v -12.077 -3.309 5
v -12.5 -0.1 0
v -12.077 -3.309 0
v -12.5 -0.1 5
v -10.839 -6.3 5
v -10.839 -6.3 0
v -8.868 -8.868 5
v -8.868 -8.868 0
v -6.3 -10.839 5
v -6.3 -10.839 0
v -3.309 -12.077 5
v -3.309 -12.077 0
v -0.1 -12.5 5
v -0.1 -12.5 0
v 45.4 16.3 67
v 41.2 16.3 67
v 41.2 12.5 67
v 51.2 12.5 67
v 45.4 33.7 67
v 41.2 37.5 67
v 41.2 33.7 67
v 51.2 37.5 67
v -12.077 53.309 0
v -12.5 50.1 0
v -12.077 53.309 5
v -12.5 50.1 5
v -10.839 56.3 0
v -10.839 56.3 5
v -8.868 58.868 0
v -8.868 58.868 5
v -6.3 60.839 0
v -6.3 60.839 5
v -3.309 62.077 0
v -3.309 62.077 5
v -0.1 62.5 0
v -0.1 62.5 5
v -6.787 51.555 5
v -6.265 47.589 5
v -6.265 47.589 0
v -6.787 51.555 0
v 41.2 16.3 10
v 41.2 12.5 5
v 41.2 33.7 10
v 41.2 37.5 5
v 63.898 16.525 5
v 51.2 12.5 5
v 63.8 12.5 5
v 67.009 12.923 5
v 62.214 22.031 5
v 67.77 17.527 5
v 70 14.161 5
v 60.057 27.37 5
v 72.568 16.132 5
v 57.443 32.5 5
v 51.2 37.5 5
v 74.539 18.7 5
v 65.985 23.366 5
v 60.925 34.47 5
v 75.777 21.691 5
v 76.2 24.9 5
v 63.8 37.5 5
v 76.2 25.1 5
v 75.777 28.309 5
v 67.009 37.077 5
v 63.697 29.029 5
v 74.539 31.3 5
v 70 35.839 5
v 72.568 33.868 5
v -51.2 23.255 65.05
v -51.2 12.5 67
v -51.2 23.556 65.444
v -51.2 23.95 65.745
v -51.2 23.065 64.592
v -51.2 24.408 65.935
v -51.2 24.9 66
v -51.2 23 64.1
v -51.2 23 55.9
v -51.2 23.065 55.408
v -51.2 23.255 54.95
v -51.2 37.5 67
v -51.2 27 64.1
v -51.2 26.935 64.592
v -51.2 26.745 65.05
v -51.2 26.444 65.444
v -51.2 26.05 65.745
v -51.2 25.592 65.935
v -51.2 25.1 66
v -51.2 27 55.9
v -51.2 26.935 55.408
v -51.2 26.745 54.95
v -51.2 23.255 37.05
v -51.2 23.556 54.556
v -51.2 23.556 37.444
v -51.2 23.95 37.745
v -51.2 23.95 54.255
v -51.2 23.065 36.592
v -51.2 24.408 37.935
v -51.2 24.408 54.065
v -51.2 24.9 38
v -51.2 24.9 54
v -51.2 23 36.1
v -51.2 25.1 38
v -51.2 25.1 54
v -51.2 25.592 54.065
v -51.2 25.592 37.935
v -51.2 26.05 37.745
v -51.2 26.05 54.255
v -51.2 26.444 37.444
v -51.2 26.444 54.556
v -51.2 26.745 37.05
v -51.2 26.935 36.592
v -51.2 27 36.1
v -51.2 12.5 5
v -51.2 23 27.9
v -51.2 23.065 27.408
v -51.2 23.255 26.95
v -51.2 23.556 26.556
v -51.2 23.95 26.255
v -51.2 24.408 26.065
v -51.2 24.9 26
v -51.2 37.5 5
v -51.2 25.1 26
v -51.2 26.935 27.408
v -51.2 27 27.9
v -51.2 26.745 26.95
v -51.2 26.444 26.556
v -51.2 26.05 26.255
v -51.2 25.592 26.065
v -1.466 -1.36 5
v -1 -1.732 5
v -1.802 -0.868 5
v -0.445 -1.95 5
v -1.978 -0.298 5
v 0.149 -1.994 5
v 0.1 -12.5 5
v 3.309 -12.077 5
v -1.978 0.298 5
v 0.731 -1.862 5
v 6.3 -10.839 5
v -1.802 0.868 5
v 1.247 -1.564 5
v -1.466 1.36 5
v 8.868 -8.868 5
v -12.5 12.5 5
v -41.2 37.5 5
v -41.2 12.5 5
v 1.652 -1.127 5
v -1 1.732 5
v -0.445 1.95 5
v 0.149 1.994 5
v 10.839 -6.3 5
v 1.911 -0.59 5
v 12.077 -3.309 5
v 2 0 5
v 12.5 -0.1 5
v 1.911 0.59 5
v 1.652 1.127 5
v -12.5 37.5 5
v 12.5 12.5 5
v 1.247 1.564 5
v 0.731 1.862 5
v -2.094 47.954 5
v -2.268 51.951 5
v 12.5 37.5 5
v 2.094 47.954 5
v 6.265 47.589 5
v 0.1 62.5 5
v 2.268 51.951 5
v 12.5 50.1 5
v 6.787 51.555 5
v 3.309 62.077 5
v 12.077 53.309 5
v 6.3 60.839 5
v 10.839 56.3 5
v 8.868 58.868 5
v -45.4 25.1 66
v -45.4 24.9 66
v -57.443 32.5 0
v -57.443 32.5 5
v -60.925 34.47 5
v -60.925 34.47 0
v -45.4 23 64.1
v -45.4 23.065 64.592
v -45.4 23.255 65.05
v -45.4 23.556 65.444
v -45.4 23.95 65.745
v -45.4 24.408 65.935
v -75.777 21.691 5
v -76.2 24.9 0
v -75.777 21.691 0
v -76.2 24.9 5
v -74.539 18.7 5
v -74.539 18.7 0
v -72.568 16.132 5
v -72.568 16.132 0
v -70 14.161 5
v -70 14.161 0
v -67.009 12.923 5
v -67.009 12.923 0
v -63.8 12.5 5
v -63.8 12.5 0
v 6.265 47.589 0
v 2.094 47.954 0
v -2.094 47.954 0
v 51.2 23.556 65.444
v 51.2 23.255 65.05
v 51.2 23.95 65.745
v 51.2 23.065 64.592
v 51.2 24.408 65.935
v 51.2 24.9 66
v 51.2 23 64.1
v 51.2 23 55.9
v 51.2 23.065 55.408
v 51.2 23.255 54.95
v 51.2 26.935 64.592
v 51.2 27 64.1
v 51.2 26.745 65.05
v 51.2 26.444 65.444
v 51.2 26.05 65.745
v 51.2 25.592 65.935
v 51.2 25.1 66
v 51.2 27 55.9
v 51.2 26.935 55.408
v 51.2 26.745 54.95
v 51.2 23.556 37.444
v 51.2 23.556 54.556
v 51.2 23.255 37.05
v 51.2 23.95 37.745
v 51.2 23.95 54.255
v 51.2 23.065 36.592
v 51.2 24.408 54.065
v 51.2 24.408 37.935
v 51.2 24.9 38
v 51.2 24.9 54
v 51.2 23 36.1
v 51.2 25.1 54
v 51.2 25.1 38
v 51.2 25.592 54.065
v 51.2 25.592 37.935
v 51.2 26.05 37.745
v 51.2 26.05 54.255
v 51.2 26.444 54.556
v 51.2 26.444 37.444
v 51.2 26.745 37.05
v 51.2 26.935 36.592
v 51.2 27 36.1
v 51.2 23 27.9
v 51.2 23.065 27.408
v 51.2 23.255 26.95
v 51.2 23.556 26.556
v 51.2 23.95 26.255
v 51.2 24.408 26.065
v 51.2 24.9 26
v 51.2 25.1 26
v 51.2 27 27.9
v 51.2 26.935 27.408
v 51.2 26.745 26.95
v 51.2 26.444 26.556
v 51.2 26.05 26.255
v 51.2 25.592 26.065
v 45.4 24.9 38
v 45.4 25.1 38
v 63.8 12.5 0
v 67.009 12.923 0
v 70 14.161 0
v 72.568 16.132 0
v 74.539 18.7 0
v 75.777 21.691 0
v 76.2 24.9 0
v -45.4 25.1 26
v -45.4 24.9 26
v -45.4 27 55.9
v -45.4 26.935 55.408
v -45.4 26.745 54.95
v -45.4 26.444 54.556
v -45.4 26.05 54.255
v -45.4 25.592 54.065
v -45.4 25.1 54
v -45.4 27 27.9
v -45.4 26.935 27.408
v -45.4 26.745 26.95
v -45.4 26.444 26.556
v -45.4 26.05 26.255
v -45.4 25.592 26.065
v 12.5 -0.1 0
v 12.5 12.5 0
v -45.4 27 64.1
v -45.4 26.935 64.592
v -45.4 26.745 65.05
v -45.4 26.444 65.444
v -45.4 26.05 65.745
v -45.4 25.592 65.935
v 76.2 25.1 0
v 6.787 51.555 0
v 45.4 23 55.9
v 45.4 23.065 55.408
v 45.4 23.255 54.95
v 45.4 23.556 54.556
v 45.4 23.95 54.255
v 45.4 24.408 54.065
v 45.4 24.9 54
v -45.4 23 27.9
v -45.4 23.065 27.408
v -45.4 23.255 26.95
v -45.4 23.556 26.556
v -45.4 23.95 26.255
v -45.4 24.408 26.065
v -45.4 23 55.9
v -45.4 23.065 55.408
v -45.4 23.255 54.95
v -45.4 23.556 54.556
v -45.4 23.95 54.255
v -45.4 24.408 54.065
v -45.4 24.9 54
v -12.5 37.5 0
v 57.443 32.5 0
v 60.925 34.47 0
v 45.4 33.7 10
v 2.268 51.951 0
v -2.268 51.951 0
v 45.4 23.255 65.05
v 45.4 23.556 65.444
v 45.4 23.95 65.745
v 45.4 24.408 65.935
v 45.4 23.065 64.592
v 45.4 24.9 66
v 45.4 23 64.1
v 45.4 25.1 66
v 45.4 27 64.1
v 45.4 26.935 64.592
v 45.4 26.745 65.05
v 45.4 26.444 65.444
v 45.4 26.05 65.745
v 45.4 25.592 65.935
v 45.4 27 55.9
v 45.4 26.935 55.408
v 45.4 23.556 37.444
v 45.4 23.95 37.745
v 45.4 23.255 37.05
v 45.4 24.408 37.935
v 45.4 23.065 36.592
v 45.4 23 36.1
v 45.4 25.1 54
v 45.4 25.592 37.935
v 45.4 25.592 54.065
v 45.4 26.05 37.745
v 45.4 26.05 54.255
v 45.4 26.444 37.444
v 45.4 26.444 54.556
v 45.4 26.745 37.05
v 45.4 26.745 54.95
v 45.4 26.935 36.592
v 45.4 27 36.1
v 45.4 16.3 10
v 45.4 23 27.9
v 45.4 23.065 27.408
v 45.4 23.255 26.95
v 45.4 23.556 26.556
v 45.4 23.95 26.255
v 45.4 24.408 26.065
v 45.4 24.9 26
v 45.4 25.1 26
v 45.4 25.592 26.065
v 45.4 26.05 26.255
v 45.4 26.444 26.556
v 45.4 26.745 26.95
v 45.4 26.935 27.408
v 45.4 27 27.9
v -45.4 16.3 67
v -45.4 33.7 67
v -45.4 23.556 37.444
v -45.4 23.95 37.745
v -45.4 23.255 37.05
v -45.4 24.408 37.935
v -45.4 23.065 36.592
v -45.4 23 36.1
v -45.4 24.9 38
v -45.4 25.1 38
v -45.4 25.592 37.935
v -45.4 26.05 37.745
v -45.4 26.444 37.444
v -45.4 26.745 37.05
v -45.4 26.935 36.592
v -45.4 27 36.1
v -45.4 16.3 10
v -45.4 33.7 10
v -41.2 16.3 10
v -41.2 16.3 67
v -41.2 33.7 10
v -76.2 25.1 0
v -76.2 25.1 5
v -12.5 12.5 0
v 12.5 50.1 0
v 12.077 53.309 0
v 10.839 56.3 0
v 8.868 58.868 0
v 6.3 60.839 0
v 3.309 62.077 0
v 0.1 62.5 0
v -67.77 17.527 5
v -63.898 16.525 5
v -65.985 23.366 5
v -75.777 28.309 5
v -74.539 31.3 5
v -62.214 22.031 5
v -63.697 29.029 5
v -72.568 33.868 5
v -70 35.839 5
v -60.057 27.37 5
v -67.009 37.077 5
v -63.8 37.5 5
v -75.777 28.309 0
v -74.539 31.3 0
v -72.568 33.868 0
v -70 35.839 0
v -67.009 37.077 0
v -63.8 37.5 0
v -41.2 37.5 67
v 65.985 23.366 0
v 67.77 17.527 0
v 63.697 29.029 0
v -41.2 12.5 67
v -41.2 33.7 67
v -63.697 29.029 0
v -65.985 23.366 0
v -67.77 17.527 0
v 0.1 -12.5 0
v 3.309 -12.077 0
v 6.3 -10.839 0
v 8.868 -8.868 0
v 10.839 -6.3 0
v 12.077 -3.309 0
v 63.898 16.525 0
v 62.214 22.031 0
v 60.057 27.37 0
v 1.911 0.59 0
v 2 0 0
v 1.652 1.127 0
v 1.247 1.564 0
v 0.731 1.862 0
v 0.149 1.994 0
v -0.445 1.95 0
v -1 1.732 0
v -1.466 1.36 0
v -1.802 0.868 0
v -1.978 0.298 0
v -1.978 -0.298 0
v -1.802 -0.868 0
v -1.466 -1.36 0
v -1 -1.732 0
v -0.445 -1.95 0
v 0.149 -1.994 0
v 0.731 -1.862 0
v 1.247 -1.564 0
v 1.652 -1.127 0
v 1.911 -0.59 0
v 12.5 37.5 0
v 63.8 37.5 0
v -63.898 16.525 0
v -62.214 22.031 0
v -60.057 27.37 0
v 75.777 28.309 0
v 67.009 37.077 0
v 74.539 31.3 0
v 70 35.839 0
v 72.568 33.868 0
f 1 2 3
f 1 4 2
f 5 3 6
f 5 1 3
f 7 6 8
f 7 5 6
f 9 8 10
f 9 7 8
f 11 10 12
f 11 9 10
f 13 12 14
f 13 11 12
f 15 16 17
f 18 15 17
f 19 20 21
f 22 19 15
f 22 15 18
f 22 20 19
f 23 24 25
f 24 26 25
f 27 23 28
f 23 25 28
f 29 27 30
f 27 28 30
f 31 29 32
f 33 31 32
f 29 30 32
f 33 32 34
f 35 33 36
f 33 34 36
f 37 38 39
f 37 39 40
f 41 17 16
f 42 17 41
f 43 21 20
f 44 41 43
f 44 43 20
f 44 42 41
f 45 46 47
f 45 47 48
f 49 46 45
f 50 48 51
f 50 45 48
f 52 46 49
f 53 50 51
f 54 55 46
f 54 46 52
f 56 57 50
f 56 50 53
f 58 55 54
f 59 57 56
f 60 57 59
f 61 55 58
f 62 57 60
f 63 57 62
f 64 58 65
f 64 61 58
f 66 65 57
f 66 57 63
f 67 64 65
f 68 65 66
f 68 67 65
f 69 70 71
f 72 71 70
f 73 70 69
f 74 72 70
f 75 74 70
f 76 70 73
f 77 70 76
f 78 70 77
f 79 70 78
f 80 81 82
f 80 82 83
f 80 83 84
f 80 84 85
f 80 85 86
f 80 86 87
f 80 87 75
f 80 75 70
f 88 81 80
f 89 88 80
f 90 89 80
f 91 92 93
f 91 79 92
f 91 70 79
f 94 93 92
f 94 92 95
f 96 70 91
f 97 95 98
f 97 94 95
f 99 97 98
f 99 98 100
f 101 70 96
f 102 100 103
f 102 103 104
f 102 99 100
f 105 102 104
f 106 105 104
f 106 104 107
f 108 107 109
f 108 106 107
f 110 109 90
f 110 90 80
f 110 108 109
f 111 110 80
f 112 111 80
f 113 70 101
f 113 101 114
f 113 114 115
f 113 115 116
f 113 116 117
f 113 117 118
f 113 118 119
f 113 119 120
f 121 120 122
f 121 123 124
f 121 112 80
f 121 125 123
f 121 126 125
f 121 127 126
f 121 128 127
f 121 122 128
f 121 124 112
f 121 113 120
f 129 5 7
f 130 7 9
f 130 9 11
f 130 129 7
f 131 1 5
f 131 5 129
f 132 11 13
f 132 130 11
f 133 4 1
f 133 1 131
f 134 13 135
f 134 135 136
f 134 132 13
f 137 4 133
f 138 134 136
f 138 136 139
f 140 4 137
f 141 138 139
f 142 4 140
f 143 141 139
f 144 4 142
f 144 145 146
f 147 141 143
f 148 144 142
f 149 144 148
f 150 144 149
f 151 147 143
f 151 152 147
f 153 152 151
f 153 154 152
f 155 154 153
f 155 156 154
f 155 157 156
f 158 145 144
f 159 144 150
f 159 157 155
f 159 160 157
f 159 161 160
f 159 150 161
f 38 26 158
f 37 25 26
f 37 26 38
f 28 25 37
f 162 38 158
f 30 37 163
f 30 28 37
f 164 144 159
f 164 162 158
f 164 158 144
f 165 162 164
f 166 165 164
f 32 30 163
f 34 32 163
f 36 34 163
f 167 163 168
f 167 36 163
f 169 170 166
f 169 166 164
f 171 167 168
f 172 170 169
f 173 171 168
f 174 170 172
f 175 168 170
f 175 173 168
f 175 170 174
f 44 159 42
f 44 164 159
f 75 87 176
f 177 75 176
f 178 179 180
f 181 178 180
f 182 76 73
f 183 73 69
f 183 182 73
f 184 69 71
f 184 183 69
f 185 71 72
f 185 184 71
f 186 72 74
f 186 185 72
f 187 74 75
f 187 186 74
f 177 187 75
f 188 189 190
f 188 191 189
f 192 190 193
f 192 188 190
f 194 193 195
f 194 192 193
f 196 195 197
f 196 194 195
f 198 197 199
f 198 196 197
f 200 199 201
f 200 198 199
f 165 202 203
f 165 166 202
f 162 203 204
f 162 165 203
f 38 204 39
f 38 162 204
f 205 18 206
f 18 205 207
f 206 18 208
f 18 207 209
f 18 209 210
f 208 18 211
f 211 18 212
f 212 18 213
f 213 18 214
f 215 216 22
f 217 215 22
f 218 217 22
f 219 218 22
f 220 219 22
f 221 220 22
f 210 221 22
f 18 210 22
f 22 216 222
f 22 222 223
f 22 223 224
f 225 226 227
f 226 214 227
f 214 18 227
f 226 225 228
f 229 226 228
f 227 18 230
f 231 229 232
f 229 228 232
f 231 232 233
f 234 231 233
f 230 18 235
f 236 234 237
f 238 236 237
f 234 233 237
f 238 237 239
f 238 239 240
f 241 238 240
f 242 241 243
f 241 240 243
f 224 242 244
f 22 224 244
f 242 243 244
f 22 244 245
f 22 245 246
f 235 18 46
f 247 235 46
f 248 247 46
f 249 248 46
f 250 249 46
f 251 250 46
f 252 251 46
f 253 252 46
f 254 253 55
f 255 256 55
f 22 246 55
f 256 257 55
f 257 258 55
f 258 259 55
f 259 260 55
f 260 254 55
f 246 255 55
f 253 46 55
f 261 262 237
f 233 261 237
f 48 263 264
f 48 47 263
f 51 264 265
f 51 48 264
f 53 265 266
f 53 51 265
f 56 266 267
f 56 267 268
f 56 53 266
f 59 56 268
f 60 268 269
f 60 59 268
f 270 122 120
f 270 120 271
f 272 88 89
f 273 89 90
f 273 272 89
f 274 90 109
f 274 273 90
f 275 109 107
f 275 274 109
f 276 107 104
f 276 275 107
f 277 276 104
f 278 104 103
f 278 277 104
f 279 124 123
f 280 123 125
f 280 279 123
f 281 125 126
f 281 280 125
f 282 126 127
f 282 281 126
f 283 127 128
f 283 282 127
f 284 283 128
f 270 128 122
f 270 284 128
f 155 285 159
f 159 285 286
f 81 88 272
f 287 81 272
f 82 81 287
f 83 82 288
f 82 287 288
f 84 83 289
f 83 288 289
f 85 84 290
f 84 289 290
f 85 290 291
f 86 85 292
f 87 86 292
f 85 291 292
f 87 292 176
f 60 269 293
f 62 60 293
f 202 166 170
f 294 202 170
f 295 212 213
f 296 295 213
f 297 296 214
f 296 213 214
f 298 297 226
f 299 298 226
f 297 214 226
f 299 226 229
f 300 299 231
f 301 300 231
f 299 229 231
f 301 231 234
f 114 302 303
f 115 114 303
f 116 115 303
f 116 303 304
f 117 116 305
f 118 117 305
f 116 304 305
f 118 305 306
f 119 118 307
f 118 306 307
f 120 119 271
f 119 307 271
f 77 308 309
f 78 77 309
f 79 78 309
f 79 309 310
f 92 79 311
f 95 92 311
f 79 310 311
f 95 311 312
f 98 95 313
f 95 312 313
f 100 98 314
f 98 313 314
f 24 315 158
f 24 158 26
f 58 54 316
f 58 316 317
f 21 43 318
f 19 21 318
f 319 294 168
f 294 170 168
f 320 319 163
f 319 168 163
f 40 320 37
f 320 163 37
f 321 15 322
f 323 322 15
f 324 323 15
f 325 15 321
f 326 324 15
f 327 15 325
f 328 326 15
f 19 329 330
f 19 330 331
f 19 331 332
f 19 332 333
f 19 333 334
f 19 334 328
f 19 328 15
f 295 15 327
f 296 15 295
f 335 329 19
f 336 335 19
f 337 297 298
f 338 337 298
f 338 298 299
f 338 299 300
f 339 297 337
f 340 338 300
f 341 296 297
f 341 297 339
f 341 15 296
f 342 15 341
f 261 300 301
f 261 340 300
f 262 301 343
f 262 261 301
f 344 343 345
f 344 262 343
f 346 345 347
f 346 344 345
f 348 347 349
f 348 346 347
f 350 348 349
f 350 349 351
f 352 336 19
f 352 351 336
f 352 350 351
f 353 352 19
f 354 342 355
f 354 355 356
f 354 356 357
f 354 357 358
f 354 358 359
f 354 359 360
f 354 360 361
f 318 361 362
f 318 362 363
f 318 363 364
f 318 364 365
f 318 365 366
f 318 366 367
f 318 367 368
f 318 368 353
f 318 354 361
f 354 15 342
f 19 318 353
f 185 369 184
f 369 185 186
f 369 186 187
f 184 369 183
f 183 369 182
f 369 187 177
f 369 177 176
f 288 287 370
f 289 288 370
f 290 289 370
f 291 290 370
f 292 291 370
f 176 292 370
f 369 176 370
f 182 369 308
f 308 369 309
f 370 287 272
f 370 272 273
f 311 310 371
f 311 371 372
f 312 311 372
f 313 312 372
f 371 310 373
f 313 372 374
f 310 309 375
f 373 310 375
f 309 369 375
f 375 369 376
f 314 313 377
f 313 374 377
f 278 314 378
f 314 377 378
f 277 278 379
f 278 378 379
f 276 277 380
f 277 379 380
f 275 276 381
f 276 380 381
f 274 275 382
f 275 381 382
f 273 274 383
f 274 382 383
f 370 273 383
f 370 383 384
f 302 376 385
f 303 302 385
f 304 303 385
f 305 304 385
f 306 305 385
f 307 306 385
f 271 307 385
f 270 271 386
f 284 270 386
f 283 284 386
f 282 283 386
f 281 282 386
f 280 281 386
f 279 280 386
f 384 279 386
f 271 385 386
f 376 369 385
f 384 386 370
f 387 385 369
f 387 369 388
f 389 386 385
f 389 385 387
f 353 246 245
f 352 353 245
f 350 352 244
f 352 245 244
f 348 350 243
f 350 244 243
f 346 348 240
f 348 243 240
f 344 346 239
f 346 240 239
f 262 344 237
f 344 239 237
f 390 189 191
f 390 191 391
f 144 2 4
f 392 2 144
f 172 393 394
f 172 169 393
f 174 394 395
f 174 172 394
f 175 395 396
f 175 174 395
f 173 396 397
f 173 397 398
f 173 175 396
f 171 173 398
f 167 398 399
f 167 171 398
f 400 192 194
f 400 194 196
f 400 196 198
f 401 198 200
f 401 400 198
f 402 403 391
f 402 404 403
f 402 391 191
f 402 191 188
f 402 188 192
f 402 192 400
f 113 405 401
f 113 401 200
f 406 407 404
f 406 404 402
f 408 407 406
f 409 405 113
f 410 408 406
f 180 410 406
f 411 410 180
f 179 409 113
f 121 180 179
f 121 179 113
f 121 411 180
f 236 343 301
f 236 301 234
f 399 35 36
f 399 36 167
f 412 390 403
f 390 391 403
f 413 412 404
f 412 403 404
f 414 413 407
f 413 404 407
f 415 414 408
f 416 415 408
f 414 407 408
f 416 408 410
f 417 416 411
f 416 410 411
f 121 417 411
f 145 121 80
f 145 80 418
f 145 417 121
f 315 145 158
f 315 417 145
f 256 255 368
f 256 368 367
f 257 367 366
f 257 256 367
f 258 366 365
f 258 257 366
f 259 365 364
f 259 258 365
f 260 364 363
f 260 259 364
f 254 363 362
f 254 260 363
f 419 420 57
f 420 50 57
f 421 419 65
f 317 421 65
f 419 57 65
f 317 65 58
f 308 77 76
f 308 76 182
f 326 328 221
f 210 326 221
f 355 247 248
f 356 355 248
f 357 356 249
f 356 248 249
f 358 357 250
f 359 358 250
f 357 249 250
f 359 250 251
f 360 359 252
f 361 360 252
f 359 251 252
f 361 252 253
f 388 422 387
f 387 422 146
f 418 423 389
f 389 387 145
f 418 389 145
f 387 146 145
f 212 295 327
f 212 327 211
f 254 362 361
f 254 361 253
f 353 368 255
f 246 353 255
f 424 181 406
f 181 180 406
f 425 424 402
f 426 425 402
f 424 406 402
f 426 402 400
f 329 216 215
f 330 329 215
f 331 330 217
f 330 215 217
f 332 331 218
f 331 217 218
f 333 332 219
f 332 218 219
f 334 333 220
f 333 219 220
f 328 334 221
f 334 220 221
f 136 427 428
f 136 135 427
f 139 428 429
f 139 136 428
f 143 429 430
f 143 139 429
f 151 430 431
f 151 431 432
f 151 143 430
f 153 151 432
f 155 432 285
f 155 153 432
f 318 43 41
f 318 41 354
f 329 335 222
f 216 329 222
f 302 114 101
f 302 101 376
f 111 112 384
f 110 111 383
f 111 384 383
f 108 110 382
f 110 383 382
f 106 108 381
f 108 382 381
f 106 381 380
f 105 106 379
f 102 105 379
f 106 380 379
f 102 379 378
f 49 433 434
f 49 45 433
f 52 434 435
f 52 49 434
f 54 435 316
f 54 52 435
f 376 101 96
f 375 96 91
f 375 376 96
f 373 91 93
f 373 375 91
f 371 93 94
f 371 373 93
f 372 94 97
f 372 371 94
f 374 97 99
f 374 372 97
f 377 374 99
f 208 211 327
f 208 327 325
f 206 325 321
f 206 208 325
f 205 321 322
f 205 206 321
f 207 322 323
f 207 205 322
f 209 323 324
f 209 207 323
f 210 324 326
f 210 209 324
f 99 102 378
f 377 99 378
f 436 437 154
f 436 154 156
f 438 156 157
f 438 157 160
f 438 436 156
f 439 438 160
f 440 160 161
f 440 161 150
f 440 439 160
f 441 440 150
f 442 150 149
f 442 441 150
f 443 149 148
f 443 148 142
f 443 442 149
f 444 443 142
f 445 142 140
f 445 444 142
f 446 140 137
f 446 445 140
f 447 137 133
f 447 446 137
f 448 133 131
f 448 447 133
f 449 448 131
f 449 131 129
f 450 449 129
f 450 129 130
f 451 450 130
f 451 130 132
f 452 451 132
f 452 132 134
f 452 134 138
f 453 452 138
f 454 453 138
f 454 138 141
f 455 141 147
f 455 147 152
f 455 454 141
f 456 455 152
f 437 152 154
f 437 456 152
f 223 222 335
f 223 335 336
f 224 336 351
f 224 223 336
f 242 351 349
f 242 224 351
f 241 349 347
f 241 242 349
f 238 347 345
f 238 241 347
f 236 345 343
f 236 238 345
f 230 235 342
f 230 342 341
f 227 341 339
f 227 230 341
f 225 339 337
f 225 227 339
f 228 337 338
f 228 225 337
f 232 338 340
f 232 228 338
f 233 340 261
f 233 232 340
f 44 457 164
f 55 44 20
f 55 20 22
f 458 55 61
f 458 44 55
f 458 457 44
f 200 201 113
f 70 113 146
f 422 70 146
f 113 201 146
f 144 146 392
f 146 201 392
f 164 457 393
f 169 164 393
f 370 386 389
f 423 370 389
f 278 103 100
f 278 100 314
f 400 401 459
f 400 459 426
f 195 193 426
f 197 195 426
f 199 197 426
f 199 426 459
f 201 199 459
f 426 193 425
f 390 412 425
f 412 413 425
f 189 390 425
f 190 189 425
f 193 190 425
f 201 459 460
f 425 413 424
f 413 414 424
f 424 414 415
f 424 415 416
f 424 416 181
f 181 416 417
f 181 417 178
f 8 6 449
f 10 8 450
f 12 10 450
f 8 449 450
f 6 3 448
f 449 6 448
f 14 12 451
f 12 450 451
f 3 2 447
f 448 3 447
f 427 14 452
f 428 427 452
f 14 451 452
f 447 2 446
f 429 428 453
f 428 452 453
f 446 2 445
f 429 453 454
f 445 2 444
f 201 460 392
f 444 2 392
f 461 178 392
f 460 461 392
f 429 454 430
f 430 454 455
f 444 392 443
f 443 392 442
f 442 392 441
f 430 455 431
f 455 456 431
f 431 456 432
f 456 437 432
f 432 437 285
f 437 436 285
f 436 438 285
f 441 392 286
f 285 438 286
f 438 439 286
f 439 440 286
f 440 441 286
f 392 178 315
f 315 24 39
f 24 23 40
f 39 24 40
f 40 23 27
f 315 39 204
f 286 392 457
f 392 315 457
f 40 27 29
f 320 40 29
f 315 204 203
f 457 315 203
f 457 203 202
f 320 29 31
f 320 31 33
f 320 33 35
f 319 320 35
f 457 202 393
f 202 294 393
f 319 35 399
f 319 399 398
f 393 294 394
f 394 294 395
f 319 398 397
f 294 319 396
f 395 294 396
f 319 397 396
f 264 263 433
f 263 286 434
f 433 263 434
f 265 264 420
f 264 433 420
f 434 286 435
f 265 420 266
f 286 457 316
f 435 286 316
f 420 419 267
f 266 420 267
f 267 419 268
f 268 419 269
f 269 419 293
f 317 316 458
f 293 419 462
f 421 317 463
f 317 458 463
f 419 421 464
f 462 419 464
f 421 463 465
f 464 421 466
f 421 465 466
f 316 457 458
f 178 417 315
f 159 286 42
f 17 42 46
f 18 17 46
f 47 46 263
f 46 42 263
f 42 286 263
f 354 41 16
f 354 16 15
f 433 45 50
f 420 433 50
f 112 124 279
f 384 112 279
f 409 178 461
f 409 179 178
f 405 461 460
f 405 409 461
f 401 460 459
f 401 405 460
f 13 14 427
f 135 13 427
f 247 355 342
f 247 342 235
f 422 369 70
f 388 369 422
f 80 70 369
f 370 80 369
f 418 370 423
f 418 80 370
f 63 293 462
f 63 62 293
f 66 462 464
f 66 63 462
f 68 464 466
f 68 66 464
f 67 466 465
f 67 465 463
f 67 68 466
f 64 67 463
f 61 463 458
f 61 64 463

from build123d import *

# Parameters (mm, degrees)
BOX011_W                    = 6
BOX011_H                    = 4
BOX011_DEPTH                = 12
FILLET009_R                 = 1.9
BOX013_W                    = 4.2
BOX013_H                    = 17.4
BOX013_DEPTH                = 67
BOX010_W                    = 6
BOX010_H                    = 4
BOX010_DEPTH                = 12
FILLET008_R                 = 1.9
BOX012_W                    = 10
BOX012_H                    = 25
BOX012_DEPTH                = 67
BOX007_W                    = 4.2
BOX007_H                    = 17.4
BOX007_DEPTH                = 67
BOX008_W                    = 6
BOX008_H                    = 4
BOX008_DEPTH                = 12
FILLET006_R                 = 1.9
BOX009_W                    = 6
BOX009_H                    = 4
BOX009_DEPTH                = 12
FILLET007_R                 = 1.9
BOX006_W                    = 10
BOX006_H                    = 25
BOX006_DEPTH                = 67
CYLINDER002_W               = 66
CYLINDER002_H               = 5
CYLINDER002_ANGLE           = 15
CYLINDER002_PLACEMENT_ANGLE = 14.5
CYLINDER001_W               = 70
CYLINDER001_H               = 5
CYLINDER001_ANGLE           = 15
CYLINDER001_PLACEMENT_ANGLE = 14.5
CYLINDER004_W               = 48
CYLINDER004_H               = 5
CYLINDER004_ANGLE           = 15
CYLINDER004_PLACEMENT_ANGLE = 82.5
CYLINDER003_W               = 52
CYLINDER003_H               = 5
CYLINDER003_ANGLE           = 15
CYLINDER003_PLACEMENT_ANGLE = 82.5
CYLINDER007_R               = 2
CYLINDER007_DEPTH           = 5
CYLINDER006_W               = 66
CYLINDER006_H               = 5
CYLINDER006_ANGLE           = 15
CYLINDER006_PLACEMENT_ANGLE = 150.5
CYLINDER005_W               = 70
CYLINDER005_H               = 5
CYLINDER005_ANGLE           = 15
CYLINDER005_PLACEMENT_ANGLE = 150.5
BOX015_W                    = 25
BOX015_H                    = 75
BOX015_DEPTH                = 5
FILLET011_R                 = 12.4
BOX014_W                    = 152.4
BOX014_H                    = 25
BOX014_DEPTH                = 5
FILLET010_R                 = 12.4


with BuildPart() as fillet009:
    # Box011 → Box011 (new body)
    with BuildSketch(Plane(origin=(-45, 23, 26), x_dir=(1, 0, 0), z_dir=(0, 0, 1))):
        with Locations((3, 2)):
            Rectangle(BOX011_W, BOX011_H)
    extrude(amount=BOX011_DEPTH)

    # Fillet009
    fillet009_edges = [fillet009.edges().sort_by_distance(p)[0] for p in [
        (-42, 23, 26),
        (-42, 23, 38),
        (-42, 27, 26),
        (-42, 27, 38),
    ]]
    fillet(fillet009_edges, radius=FILLET009_R)


with BuildPart() as w_rfel013:
    # Box013 → Box013 (new body)
    with BuildSketch(Plane(origin=(-39.2, 16.3, 10), x_dir=(1, 0, 0), z_dir=(0, 0, 1))):
        with Locations((2.1, 8.7)):
            Rectangle(BOX013_W, BOX013_H)
    extrude(amount=BOX013_DEPTH)


with BuildPart() as fusion003:
    # Box010 → Box010 (new body)
    with BuildSketch(Plane(origin=(-45, 23, 54), x_dir=(1, 0, 0), z_dir=(0, 0, 1))):
        with Locations((3, 2)):
            Rectangle(BOX010_W, BOX010_H)
    extrude(amount=BOX010_DEPTH)

    # Fillet008
    fillet008_edges = [fusion003.edges().sort_by_distance(p)[0] for p in [
        (-42, 23, 54),
        (-42, 23, 66),
        (-42, 27, 54),
        (-42, 27, 66),
    ]]
    fillet(fillet008_edges, radius=FILLET008_R)

    # Fusion003: union Fillet009, Würfel013
    add(fillet009.part)
    add(w_rfel013.part)


with BuildPart() as stuetze002:
    # Box012 → Box012 (new body)
    with BuildSketch(Plane(origin=(-45, 12.5, 0), x_dir=(1, 0, 0), z_dir=(0, 0, 1))):
        with Locations((5, 12.5)):
            Rectangle(BOX012_W, BOX012_H)
    extrude(amount=BOX012_DEPTH)

    # Cut006: cut Fusion003
    add(fusion003.part, mode=Mode.SUBTRACT)


with BuildPart() as stuetze002_1:
    # Cut006 placement: moved
    add(stuetze002.part.moved(Location((-6.2, 0, 0))))


with BuildPart() as w_rfel007:
    # Box007 → Box007 (new body)
    with BuildSketch(Plane(origin=(35, 16.3, 10), x_dir=(1, 0, 0), z_dir=(0, 0, 1))):
        with Locations((2.1, 8.7)):
            Rectangle(BOX007_W, BOX007_H)
    extrude(amount=BOX007_DEPTH)


with BuildPart() as fillet006:
    # Box008 → Box008 (new body)
    with BuildSketch(Plane(origin=(39, 23, 54), x_dir=(1, 0, 0), z_dir=(0, 0, 1))):
        with Locations((3, 2)):
            Rectangle(BOX008_W, BOX008_H)
    extrude(amount=BOX008_DEPTH)

    # Fillet006
    fillet006_edges = [fillet006.edges().sort_by_distance(p)[0] for p in [
        (42, 23, 54),
        (42, 23, 66),
        (42, 27, 54),
        (42, 27, 66),
    ]]
    fillet(fillet006_edges, radius=FILLET006_R)


with BuildPart() as fusion002:
    # Box009 → Box009 (new body)
    with BuildSketch(Plane(origin=(39, 23, 26), x_dir=(1, 0, 0), z_dir=(0, 0, 1))):
        with Locations((3, 2)):
            Rectangle(BOX009_W, BOX009_H)
    extrude(amount=BOX009_DEPTH)

    # Fillet007
    fillet007_edges = [fusion002.edges().sort_by_distance(p)[0] for p in [
        (42, 23, 26),
        (42, 23, 38),
        (42, 27, 26),
        (42, 27, 38),
    ]]
    fillet(fillet007_edges, radius=FILLET007_R)

    # Fusion002: union Würfel007, Fillet006
    add(w_rfel007.part)
    add(fillet006.part)


with BuildPart() as stuetze001:
    # Box006 → Box006 (new body)
    with BuildSketch(Plane(origin=(35, 12.5, 0), x_dir=(1, 0, 0), z_dir=(0, 0, 1))):
        with Locations((5, 12.5)):
            Rectangle(BOX006_W, BOX006_H)
    extrude(amount=BOX006_DEPTH)

    # Cut005: cut Fusion002
    add(fusion002.part, mode=Mode.SUBTRACT)


with BuildPart() as stuetze001_1:
    # Cut005 placement: moved
    add(stuetze001.part.moved(Location((6.2, 0, 0))))


with BuildPart() as zylinder002:
    # Cylinder002 → Cylinder002 (revolve)
    with BuildSketch(Plane.XZ):
        with Locations((33, 2.5)):
            Rectangle(CYLINDER002_W, CYLINDER002_H)
    revolve(axis=Axis((0, 0, 0), (0, 0, 1)), revolution_arc=CYLINDER002_ANGLE)


with BuildPart() as zylinder002_1:
    # Cylinder002 placement: moved
    add(zylinder002.part.rotate(Axis((0, 0, 0), (0, 0, 1)), CYLINDER002_PLACEMENT_ANGLE))


with BuildPart() as bohrschlitz001:
    # Cylinder001 → Cylinder001 (revolve)
    with BuildSketch(Plane.XZ):
        with Locations((35, 2.5)):
            Rectangle(CYLINDER001_W, CYLINDER001_H)
    revolve(axis=Axis((0, 0, 0), (0, 0, 1)), revolution_arc=CYLINDER001_ANGLE)


with BuildPart() as bohrschlitz001_1:
    # Cylinder001 placement: moved
    add(bohrschlitz001.part.rotate(Axis((0, 0, 0), (0, 0, 1)), CYLINDER001_PLACEMENT_ANGLE))

    # Cut: cut Zylinder002
    add(zylinder002_1.part, mode=Mode.SUBTRACT)


with BuildPart() as zylinder004:
    # Cylinder004 → Cylinder004 (revolve)
    with BuildSketch(Plane.XZ):
        with Locations((24, 2.5)):
            Rectangle(CYLINDER004_W, CYLINDER004_H)
    revolve(axis=Axis((0, 0, 0), (0, 0, 1)), revolution_arc=CYLINDER004_ANGLE)


with BuildPart() as zylinder004_1:
    # Cylinder004 placement: moved
    add(zylinder004.part.rotate(Axis((0, 0, 0), (0, 0, 1)), CYLINDER004_PLACEMENT_ANGLE))


with BuildPart() as bohrschlitz002:
    # Cylinder003 → Cylinder003 (revolve)
    with BuildSketch(Plane.XZ):
        with Locations((26, 2.5)):
            Rectangle(CYLINDER003_W, CYLINDER003_H)
    revolve(axis=Axis((0, 0, 0), (0, 0, 1)), revolution_arc=CYLINDER003_ANGLE)


with BuildPart() as bohrschlitz002_1:
    # Cylinder003 placement: moved
    add(bohrschlitz002.part.rotate(Axis((0, 0, 0), (0, 0, 1)), CYLINDER003_PLACEMENT_ANGLE))

    # Cut001: cut Zylinder004
    add(zylinder004_1.part, mode=Mode.SUBTRACT)


with BuildPart() as borhloch002:
    # Cylinder007 → Cylinder007 (new body)
    with BuildSketch(Plane.XY):
        Circle(CYLINDER007_R)
    extrude(amount=CYLINDER007_DEPTH)


with BuildPart() as zylinder006:
    # Cylinder006 → Cylinder006 (revolve)
    with BuildSketch(Plane.XZ):
        with Locations((33, 2.5)):
            Rectangle(CYLINDER006_W, CYLINDER006_H)
    revolve(axis=Axis((0, 0, 0), (0, 0, 1)), revolution_arc=CYLINDER006_ANGLE)


with BuildPart() as zylinder006_1:
    # Cylinder006 placement: moved
    add(zylinder006.part.rotate(Axis((0, 0, 0), (0, 0, 1)), CYLINDER006_PLACEMENT_ANGLE))


with BuildPart() as bohrschlitze_sockel:
    # Cylinder005 → Cylinder005 (revolve)
    with BuildSketch(Plane.XZ):
        with Locations((35, 2.5)):
            Rectangle(CYLINDER005_W, CYLINDER005_H)
    revolve(axis=Axis((0, 0, 0), (0, 0, 1)), revolution_arc=CYLINDER005_ANGLE)


with BuildPart() as bohrschlitze_sockel_1:
    # Cylinder005 placement: moved
    add(bohrschlitze_sockel.part.rotate(Axis((0, 0, 0), (0, 0, 1)), CYLINDER005_PLACEMENT_ANGLE))

    # Cut002: cut Zylinder006
    add(zylinder006_1.part, mode=Mode.SUBTRACT)

    # Fusion004: union Bohrschlitz001, Bohrschlitz002, Borhloch002
    add(bohrschlitz001_1.part)
    add(bohrschlitz002_1.part)
    add(borhloch002.part)


with BuildPart() as fillet002:
    # Box015 → Box015 (new body)
    with BuildSketch(Plane(origin=(-12.5, -12.5, 0), x_dir=(1, 0, 0), z_dir=(0, 0, 1))):
        with Locations((12.5, 37.5)):
            Rectangle(BOX015_W, BOX015_H)
    extrude(amount=BOX015_DEPTH)

    # Fillet011
    fillet011_edges = [fillet002.edges().sort_by_distance(p)[0] for p in [
        (-12.5, -12.5, 2.5),
        (-12.5, 62.5, 2.5),
        (12.5, -12.5, 2.5),
        (12.5, 62.5, 2.5),
    ]]
    fillet(fillet011_edges, radius=FILLET011_R)


with BuildPart() as fusion:
    # Box014 → Box014 (new body)
    with BuildSketch(Plane(origin=(-76.2, 12.5, 0), x_dir=(1, 0, 0), z_dir=(0, 0, 1))):
        with Locations((76.2, 12.5)):
            Rectangle(BOX014_W, BOX014_H)
    extrude(amount=BOX014_DEPTH)

    # Fillet010
    fillet010_edges = [fusion.edges().sort_by_distance(p)[0] for p in [
        (-76.2, 12.5, 2.5),
        (-76.2, 37.5, 2.5),
        (76.2, 12.5, 2.5),
        (76.2, 37.5, 2.5),
    ]]
    fillet(fillet010_edges, radius=FILLET010_R)

    # Fusion005: union Fillet002
    add(fillet002.part)

    # Cut007: cut Bohrschlitze_Sockel
    add(bohrschlitze_sockel_1.part, mode=Mode.SUBTRACT)

    # Fusion: union Stuetze002, Stuetze001
    add(stuetze002_1.part)
    add(stuetze001_1.part)


solid = fusion.part
